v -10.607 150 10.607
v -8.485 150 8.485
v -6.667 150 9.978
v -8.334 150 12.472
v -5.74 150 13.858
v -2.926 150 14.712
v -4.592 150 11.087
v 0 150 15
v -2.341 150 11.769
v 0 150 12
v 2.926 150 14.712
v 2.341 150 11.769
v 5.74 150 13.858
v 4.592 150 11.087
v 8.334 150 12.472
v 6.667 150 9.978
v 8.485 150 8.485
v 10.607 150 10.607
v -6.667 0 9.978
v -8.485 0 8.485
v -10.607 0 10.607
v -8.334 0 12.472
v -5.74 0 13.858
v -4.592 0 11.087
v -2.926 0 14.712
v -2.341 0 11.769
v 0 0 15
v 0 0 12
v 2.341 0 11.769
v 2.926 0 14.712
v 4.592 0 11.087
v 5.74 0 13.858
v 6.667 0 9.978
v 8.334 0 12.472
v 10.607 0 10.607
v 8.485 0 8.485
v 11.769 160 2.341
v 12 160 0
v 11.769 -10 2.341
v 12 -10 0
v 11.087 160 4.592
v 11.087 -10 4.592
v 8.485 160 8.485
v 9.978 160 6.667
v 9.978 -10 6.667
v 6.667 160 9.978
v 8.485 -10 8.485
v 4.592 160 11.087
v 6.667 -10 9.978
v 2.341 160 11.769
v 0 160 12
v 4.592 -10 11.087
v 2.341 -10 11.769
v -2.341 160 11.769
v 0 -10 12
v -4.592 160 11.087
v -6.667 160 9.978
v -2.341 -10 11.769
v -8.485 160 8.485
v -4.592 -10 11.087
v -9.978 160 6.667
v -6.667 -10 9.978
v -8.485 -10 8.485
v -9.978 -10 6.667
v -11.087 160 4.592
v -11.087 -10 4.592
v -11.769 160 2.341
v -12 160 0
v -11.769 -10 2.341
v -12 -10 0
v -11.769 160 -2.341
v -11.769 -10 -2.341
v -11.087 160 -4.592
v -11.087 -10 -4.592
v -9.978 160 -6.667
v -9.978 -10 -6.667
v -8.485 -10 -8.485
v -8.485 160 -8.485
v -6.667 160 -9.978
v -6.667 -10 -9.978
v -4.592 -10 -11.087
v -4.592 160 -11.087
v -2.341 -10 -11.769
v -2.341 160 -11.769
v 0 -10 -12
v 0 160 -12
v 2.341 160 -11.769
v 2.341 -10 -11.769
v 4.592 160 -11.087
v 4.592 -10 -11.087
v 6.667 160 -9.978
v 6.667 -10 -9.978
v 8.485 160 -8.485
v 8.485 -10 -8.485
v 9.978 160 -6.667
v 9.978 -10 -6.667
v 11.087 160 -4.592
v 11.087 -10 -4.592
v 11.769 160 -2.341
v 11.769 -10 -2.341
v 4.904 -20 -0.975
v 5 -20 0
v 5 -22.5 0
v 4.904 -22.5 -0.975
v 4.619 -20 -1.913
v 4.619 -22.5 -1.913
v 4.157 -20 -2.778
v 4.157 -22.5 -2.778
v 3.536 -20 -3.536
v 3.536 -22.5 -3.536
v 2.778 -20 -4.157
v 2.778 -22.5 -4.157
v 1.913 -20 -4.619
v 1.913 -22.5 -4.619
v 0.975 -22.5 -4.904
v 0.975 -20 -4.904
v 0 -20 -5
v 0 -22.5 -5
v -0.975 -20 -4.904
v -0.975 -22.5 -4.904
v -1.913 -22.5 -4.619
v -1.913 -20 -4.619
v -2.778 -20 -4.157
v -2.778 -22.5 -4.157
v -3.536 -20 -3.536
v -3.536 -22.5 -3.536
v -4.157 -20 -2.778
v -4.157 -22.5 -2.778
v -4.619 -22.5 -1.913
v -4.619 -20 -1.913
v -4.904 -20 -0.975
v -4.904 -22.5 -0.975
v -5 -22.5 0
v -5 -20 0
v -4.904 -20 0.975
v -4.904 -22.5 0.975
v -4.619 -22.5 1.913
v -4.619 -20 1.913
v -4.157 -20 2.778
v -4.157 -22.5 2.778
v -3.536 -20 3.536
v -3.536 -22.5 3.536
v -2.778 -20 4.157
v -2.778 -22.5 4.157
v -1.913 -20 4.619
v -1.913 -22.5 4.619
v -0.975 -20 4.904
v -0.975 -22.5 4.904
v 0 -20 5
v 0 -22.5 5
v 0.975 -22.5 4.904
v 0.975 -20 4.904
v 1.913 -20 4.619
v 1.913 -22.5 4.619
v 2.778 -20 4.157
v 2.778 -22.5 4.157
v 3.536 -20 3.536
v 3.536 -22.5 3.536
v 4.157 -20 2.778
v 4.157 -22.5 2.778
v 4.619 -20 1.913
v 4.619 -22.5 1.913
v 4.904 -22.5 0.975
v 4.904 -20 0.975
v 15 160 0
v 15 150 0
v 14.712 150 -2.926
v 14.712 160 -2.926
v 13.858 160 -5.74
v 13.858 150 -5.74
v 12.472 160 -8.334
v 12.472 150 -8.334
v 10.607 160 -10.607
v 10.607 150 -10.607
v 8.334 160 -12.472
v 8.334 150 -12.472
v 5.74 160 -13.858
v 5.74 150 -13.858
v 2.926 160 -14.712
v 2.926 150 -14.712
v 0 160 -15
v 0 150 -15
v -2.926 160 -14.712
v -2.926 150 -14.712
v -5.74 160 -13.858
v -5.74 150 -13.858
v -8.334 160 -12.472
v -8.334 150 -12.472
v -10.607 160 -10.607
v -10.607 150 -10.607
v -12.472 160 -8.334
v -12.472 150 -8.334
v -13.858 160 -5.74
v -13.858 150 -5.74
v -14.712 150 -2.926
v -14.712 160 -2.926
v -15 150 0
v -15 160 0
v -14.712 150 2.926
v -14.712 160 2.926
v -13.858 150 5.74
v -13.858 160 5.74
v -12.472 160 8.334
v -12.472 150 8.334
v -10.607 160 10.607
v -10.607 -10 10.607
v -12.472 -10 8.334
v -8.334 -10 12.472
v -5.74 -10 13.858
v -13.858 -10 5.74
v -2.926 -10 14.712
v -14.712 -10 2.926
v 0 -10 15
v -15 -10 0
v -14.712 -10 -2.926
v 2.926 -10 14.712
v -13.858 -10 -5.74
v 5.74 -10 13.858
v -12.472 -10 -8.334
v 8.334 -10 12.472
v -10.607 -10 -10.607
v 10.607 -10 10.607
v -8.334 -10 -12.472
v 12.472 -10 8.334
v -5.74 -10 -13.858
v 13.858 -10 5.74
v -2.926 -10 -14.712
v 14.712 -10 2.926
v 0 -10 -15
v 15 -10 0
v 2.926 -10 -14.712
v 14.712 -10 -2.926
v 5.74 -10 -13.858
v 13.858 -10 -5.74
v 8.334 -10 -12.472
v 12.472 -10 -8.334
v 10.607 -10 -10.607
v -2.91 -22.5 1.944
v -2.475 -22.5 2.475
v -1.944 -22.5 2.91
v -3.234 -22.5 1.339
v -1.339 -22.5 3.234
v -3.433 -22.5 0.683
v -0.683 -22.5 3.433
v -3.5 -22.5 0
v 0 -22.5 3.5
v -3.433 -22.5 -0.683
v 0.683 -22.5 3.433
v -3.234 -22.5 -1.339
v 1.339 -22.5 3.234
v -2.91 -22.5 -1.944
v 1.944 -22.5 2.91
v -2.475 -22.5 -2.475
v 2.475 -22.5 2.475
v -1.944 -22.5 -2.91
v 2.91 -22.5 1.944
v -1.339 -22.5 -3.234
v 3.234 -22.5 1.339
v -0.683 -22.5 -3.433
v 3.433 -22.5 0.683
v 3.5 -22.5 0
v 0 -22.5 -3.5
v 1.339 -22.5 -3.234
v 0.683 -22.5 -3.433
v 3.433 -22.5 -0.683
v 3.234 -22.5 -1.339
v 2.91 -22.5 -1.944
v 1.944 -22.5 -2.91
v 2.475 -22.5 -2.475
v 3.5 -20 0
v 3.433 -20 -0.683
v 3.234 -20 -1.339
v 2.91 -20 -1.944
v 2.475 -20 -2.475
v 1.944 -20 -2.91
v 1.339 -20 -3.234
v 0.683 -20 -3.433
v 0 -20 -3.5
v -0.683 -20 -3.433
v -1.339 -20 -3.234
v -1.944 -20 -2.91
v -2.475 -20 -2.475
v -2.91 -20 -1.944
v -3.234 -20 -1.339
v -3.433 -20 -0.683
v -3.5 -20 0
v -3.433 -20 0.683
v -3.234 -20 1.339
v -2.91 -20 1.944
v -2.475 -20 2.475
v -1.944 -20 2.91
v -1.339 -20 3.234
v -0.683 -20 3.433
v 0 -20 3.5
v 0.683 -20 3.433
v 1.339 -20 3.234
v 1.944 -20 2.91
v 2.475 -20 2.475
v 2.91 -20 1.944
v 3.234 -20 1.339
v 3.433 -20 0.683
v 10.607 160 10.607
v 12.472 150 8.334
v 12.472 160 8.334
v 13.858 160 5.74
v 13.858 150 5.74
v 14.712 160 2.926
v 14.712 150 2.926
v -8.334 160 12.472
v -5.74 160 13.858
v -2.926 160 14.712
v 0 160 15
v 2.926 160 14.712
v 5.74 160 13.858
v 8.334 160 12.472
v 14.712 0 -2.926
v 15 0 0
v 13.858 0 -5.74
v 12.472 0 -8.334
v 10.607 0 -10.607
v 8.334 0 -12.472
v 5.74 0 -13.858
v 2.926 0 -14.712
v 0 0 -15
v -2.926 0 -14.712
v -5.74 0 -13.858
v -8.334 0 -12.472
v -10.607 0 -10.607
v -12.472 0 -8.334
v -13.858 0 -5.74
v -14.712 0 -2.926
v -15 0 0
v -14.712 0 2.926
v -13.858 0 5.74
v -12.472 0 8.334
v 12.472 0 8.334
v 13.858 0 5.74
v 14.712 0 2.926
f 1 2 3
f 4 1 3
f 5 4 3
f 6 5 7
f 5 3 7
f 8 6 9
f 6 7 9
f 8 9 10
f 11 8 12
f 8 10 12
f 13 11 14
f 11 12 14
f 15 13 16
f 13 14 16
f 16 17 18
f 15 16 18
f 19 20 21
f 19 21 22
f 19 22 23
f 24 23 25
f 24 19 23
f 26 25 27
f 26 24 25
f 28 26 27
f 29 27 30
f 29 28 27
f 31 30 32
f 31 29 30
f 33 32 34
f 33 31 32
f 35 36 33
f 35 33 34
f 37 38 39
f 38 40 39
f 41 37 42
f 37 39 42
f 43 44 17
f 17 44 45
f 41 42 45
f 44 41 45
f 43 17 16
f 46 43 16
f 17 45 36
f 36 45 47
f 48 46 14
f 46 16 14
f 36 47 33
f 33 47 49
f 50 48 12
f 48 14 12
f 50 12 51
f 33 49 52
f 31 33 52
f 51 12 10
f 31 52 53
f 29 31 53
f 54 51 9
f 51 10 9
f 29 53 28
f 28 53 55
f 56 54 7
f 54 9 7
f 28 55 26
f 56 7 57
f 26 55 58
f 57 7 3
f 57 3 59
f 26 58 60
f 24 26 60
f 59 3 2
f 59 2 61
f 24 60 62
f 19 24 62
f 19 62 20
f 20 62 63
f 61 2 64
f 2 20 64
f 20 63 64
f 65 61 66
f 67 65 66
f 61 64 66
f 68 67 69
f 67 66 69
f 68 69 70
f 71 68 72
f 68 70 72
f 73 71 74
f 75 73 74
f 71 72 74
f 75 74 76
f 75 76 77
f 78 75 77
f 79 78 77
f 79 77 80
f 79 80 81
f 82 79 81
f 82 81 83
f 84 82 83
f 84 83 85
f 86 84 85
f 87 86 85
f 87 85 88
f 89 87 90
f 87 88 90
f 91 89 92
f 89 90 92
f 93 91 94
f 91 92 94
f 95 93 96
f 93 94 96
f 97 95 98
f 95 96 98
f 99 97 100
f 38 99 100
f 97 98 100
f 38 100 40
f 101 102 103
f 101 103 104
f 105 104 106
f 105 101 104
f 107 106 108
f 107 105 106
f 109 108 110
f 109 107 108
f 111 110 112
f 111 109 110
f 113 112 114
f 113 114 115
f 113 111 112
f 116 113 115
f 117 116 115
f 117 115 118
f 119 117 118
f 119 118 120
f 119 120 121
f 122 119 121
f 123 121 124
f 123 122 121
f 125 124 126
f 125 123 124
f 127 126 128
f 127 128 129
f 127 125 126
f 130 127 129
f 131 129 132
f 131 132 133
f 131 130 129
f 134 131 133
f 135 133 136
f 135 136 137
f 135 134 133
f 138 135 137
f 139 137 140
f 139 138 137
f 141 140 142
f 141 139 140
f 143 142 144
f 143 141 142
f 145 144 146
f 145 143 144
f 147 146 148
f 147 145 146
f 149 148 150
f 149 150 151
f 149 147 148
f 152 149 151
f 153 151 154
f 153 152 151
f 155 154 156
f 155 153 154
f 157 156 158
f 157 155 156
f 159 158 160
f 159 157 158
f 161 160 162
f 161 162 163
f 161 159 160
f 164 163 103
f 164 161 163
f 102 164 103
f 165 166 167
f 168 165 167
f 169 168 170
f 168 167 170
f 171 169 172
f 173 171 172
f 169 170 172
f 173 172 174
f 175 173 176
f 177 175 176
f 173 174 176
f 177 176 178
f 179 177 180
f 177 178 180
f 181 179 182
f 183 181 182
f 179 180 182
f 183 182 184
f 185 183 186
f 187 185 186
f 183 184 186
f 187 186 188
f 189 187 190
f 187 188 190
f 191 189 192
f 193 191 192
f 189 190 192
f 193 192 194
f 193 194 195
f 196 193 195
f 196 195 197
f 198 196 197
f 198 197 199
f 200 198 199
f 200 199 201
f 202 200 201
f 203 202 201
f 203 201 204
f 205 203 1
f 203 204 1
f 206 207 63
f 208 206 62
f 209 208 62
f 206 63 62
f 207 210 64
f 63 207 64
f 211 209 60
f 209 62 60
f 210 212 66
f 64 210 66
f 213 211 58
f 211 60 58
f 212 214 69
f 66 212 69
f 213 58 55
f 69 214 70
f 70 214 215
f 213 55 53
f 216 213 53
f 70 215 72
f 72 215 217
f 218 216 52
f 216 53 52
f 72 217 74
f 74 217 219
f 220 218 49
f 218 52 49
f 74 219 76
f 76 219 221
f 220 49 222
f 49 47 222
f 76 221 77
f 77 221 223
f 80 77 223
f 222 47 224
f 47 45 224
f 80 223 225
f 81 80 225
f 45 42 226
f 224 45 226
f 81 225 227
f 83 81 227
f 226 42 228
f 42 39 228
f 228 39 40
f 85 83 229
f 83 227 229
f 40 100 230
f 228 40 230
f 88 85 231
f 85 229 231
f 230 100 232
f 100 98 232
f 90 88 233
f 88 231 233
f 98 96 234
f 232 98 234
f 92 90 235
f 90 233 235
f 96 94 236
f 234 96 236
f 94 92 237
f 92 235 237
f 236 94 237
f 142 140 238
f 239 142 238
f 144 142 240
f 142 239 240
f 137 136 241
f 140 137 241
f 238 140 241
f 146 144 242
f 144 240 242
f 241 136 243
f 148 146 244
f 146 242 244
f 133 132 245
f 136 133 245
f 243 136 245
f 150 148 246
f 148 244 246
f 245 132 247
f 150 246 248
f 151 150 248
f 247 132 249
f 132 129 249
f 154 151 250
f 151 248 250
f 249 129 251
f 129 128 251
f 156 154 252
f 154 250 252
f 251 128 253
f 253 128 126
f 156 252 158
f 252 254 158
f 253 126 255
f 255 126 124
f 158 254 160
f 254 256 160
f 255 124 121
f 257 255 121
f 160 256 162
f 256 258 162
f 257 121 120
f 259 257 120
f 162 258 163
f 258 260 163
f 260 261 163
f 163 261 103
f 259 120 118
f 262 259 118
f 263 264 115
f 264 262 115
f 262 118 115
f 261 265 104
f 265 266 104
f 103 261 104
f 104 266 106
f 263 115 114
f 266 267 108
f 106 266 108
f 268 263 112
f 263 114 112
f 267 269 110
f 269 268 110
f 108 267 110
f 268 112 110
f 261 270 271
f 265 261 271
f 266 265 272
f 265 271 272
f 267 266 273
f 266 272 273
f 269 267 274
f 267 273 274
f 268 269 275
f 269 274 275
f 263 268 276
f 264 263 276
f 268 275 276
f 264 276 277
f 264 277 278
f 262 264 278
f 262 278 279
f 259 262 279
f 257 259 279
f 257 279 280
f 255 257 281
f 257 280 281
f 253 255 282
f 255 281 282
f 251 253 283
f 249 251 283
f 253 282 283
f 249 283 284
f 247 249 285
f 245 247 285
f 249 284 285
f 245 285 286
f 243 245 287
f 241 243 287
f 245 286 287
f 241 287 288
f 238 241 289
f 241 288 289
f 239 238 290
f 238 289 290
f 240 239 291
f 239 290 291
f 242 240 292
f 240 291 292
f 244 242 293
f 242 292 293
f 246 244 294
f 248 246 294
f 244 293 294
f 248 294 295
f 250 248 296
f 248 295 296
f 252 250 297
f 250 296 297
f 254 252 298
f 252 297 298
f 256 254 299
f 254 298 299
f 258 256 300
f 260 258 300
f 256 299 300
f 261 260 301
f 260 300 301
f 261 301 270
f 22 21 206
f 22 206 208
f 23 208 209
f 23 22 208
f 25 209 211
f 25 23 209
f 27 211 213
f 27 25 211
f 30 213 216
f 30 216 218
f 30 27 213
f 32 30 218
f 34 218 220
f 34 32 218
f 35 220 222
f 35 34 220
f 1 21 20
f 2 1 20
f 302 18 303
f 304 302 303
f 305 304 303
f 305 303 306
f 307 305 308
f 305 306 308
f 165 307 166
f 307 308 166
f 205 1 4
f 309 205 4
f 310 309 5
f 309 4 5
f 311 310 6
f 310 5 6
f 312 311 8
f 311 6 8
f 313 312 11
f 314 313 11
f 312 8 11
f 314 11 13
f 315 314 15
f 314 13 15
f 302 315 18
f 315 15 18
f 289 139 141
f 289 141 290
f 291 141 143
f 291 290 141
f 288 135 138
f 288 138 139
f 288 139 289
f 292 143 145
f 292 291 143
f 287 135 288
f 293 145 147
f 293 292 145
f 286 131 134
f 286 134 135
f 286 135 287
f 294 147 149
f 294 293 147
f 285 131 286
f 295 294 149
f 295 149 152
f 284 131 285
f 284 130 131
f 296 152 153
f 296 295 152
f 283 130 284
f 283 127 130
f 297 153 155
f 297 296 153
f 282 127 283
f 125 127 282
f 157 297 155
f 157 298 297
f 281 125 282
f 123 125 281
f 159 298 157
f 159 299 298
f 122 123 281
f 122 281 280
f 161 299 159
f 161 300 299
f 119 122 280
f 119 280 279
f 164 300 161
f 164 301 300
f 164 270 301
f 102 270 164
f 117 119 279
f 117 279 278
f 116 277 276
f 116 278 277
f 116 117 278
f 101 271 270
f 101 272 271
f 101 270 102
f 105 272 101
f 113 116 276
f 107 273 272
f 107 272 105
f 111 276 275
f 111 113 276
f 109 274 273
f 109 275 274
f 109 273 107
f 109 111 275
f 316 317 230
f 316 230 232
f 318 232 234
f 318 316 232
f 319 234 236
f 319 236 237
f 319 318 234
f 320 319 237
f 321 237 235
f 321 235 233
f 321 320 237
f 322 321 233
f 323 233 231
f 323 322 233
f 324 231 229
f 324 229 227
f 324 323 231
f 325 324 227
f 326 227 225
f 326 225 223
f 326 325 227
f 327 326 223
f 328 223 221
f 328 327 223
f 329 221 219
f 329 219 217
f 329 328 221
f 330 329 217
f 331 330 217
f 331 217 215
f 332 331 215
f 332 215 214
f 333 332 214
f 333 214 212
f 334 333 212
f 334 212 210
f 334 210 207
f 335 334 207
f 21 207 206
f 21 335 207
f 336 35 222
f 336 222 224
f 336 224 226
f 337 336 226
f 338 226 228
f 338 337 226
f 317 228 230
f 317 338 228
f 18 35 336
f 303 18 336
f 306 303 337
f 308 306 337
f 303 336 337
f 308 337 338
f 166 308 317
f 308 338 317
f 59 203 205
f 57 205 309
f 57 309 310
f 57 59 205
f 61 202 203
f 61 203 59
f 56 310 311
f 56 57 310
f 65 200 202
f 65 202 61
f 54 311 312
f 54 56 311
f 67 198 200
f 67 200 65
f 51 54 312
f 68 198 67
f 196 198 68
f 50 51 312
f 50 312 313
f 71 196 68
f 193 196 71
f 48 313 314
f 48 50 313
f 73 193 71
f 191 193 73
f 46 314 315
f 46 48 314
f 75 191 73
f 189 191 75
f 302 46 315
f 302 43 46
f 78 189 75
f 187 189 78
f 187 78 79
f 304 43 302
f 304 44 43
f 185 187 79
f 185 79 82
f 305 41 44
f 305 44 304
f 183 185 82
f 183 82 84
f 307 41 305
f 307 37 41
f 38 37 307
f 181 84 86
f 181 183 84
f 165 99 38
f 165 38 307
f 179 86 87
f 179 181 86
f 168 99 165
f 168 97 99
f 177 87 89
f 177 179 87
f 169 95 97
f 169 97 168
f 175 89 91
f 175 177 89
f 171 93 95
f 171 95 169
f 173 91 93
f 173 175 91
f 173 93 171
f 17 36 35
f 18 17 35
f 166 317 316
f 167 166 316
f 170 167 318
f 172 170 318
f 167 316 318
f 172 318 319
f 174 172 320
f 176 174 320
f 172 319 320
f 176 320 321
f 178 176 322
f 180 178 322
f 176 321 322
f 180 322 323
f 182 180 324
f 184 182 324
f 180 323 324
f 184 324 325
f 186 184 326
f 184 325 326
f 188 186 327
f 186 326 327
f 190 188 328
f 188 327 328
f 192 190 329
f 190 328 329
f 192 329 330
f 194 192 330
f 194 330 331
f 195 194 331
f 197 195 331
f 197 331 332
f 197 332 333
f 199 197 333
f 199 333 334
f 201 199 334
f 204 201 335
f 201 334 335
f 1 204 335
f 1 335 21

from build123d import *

# Parameters (mm, degrees)
INNER_TUBE_DEPTH     = 150
BOTTOM_EXTRUDE_DEPTH = 10
TOP_START            = 150
TOP_EXTRUDE_DEPTH    = 10
BOSS_EXTRUDE4_START  = -20
SKETCH1_8_R          = 5
SKETCH1_8_R_2        = 3.5
BOSS_EXTRUDE4_DEPTH  = 2.5


with BuildPart() as part:
    # Sketch1 → Inner Tube (new body)
    with BuildSketch(Plane(origin=(0, 0, 0), x_dir=(1, 0, 0), z_dir=(0, 1, 0))):
        with BuildLine():
            Line((-10.606601718, -10.606601718), (-8.485281374, -8.485281374))
            ThreePointArc((-8.485281374, -8.485281374), (-4.592201188, 11.08655439), (12, 0))
            ThreePointArc((12, 0), (11.08655439, -4.592201188), (8.485281374, -8.485281374))
            Line((8.485281374, -8.485281374), (10.606601718, -10.606601718))
            ThreePointArc((10.606601718, -10.606601718), (13.858192988, -5.740251485), (15, 0))
            ThreePointArc((15, 0), (-5.740251485, 13.858192988), (-10.606601718, -10.606601718))
        make_face()
    extrude(amount=INNER_TUBE_DEPTH)

    # Sketch1<3> → Bottom Extrude (add)
    with BuildSketch(Plane(origin=(0, 0, 0), x_dir=(1, 0, 0), z_dir=(0, 1, 0))):
        with BuildLine():
            ThreePointArc((8.485281374, -8.485281374), (0, -12), (-8.485281374, -8.485281374))
            Line((-8.485281374, -8.485281374), (-10.606601718, -10.606601718))
            ThreePointArc((-10.606601718, -10.606601718), (0, -15), (10.606601718, -10.606601718))
            Line((10.606601718, -10.606601718), (8.485281374, -8.485281374))
        make_face()
        with BuildLine():
            Line((-10.606601718, -10.606601718), (-8.485281374, -8.485281374))
            ThreePointArc((-8.485281374, -8.485281374), (-4.592201188, 11.08655439), (12, 0))
            ThreePointArc((12, 0), (11.08655439, -4.592201188), (8.485281374, -8.485281374))
            Line((8.485281374, -8.485281374), (10.606601718, -10.606601718))
            ThreePointArc((10.606601718, -10.606601718), (13.858192988, -5.740251485), (15, 0))
            ThreePointArc((15, 0), (-5.740251485, 13.858192988), (-10.606601718, -10.606601718))
        make_face()
    extrude(amount=-BOTTOM_EXTRUDE_DEPTH)

    # Sketch1<4> → Top Extrude (add)
    with BuildSketch(Plane(origin=(0, 0, 0), x_dir=(1, 0, 0), z_dir=(0, 1, 0)).offset(TOP_START)):
        with BuildLine():
            ThreePointArc((8.485281374, -8.485281374), (0, -12), (-8.485281374, -8.485281374))
            Line((-8.485281374, -8.485281374), (-10.606601718, -10.606601718))
            ThreePointArc((-10.606601718, -10.606601718), (0, -15), (10.606601718, -10.606601718))
            Line((10.606601718, -10.606601718), (8.485281374, -8.485281374))
        make_face()
        with BuildLine():
            Line((-10.606601718, -10.606601718), (-8.485281374, -8.485281374))
            ThreePointArc((-8.485281374, -8.485281374), (-4.592201188, 11.08655439), (12, 0))
            ThreePointArc((12, 0), (11.08655439, -4.592201188), (8.485281374, -8.485281374))
            Line((8.485281374, -8.485281374), (10.606601718, -10.606601718))
            ThreePointArc((10.606601718, -10.606601718), (13.858192988, -5.740251485), (15, 0))
            ThreePointArc((15, 0), (-5.740251485, 13.858192988), (-10.606601718, -10.606601718))
        make_face()
    extrude(amount=TOP_EXTRUDE_DEPTH)


with BuildPart() as body_2:
    # Sketch1<8> → Boss-Extrude4 (new body)
    with BuildSketch(Plane(origin=(0, 0, 0), x_dir=(1, 0, 0), z_dir=(0, 1, 0)).offset(BOSS_EXTRUDE4_START)):
        Circle(SKETCH1_8_R)
        Circle(SKETCH1_8_R_2, mode=Mode.SUBTRACT)
    extrude(amount=-BOSS_EXTRUDE4_DEPTH)


solid = Compound([part.part, body_2.part])
